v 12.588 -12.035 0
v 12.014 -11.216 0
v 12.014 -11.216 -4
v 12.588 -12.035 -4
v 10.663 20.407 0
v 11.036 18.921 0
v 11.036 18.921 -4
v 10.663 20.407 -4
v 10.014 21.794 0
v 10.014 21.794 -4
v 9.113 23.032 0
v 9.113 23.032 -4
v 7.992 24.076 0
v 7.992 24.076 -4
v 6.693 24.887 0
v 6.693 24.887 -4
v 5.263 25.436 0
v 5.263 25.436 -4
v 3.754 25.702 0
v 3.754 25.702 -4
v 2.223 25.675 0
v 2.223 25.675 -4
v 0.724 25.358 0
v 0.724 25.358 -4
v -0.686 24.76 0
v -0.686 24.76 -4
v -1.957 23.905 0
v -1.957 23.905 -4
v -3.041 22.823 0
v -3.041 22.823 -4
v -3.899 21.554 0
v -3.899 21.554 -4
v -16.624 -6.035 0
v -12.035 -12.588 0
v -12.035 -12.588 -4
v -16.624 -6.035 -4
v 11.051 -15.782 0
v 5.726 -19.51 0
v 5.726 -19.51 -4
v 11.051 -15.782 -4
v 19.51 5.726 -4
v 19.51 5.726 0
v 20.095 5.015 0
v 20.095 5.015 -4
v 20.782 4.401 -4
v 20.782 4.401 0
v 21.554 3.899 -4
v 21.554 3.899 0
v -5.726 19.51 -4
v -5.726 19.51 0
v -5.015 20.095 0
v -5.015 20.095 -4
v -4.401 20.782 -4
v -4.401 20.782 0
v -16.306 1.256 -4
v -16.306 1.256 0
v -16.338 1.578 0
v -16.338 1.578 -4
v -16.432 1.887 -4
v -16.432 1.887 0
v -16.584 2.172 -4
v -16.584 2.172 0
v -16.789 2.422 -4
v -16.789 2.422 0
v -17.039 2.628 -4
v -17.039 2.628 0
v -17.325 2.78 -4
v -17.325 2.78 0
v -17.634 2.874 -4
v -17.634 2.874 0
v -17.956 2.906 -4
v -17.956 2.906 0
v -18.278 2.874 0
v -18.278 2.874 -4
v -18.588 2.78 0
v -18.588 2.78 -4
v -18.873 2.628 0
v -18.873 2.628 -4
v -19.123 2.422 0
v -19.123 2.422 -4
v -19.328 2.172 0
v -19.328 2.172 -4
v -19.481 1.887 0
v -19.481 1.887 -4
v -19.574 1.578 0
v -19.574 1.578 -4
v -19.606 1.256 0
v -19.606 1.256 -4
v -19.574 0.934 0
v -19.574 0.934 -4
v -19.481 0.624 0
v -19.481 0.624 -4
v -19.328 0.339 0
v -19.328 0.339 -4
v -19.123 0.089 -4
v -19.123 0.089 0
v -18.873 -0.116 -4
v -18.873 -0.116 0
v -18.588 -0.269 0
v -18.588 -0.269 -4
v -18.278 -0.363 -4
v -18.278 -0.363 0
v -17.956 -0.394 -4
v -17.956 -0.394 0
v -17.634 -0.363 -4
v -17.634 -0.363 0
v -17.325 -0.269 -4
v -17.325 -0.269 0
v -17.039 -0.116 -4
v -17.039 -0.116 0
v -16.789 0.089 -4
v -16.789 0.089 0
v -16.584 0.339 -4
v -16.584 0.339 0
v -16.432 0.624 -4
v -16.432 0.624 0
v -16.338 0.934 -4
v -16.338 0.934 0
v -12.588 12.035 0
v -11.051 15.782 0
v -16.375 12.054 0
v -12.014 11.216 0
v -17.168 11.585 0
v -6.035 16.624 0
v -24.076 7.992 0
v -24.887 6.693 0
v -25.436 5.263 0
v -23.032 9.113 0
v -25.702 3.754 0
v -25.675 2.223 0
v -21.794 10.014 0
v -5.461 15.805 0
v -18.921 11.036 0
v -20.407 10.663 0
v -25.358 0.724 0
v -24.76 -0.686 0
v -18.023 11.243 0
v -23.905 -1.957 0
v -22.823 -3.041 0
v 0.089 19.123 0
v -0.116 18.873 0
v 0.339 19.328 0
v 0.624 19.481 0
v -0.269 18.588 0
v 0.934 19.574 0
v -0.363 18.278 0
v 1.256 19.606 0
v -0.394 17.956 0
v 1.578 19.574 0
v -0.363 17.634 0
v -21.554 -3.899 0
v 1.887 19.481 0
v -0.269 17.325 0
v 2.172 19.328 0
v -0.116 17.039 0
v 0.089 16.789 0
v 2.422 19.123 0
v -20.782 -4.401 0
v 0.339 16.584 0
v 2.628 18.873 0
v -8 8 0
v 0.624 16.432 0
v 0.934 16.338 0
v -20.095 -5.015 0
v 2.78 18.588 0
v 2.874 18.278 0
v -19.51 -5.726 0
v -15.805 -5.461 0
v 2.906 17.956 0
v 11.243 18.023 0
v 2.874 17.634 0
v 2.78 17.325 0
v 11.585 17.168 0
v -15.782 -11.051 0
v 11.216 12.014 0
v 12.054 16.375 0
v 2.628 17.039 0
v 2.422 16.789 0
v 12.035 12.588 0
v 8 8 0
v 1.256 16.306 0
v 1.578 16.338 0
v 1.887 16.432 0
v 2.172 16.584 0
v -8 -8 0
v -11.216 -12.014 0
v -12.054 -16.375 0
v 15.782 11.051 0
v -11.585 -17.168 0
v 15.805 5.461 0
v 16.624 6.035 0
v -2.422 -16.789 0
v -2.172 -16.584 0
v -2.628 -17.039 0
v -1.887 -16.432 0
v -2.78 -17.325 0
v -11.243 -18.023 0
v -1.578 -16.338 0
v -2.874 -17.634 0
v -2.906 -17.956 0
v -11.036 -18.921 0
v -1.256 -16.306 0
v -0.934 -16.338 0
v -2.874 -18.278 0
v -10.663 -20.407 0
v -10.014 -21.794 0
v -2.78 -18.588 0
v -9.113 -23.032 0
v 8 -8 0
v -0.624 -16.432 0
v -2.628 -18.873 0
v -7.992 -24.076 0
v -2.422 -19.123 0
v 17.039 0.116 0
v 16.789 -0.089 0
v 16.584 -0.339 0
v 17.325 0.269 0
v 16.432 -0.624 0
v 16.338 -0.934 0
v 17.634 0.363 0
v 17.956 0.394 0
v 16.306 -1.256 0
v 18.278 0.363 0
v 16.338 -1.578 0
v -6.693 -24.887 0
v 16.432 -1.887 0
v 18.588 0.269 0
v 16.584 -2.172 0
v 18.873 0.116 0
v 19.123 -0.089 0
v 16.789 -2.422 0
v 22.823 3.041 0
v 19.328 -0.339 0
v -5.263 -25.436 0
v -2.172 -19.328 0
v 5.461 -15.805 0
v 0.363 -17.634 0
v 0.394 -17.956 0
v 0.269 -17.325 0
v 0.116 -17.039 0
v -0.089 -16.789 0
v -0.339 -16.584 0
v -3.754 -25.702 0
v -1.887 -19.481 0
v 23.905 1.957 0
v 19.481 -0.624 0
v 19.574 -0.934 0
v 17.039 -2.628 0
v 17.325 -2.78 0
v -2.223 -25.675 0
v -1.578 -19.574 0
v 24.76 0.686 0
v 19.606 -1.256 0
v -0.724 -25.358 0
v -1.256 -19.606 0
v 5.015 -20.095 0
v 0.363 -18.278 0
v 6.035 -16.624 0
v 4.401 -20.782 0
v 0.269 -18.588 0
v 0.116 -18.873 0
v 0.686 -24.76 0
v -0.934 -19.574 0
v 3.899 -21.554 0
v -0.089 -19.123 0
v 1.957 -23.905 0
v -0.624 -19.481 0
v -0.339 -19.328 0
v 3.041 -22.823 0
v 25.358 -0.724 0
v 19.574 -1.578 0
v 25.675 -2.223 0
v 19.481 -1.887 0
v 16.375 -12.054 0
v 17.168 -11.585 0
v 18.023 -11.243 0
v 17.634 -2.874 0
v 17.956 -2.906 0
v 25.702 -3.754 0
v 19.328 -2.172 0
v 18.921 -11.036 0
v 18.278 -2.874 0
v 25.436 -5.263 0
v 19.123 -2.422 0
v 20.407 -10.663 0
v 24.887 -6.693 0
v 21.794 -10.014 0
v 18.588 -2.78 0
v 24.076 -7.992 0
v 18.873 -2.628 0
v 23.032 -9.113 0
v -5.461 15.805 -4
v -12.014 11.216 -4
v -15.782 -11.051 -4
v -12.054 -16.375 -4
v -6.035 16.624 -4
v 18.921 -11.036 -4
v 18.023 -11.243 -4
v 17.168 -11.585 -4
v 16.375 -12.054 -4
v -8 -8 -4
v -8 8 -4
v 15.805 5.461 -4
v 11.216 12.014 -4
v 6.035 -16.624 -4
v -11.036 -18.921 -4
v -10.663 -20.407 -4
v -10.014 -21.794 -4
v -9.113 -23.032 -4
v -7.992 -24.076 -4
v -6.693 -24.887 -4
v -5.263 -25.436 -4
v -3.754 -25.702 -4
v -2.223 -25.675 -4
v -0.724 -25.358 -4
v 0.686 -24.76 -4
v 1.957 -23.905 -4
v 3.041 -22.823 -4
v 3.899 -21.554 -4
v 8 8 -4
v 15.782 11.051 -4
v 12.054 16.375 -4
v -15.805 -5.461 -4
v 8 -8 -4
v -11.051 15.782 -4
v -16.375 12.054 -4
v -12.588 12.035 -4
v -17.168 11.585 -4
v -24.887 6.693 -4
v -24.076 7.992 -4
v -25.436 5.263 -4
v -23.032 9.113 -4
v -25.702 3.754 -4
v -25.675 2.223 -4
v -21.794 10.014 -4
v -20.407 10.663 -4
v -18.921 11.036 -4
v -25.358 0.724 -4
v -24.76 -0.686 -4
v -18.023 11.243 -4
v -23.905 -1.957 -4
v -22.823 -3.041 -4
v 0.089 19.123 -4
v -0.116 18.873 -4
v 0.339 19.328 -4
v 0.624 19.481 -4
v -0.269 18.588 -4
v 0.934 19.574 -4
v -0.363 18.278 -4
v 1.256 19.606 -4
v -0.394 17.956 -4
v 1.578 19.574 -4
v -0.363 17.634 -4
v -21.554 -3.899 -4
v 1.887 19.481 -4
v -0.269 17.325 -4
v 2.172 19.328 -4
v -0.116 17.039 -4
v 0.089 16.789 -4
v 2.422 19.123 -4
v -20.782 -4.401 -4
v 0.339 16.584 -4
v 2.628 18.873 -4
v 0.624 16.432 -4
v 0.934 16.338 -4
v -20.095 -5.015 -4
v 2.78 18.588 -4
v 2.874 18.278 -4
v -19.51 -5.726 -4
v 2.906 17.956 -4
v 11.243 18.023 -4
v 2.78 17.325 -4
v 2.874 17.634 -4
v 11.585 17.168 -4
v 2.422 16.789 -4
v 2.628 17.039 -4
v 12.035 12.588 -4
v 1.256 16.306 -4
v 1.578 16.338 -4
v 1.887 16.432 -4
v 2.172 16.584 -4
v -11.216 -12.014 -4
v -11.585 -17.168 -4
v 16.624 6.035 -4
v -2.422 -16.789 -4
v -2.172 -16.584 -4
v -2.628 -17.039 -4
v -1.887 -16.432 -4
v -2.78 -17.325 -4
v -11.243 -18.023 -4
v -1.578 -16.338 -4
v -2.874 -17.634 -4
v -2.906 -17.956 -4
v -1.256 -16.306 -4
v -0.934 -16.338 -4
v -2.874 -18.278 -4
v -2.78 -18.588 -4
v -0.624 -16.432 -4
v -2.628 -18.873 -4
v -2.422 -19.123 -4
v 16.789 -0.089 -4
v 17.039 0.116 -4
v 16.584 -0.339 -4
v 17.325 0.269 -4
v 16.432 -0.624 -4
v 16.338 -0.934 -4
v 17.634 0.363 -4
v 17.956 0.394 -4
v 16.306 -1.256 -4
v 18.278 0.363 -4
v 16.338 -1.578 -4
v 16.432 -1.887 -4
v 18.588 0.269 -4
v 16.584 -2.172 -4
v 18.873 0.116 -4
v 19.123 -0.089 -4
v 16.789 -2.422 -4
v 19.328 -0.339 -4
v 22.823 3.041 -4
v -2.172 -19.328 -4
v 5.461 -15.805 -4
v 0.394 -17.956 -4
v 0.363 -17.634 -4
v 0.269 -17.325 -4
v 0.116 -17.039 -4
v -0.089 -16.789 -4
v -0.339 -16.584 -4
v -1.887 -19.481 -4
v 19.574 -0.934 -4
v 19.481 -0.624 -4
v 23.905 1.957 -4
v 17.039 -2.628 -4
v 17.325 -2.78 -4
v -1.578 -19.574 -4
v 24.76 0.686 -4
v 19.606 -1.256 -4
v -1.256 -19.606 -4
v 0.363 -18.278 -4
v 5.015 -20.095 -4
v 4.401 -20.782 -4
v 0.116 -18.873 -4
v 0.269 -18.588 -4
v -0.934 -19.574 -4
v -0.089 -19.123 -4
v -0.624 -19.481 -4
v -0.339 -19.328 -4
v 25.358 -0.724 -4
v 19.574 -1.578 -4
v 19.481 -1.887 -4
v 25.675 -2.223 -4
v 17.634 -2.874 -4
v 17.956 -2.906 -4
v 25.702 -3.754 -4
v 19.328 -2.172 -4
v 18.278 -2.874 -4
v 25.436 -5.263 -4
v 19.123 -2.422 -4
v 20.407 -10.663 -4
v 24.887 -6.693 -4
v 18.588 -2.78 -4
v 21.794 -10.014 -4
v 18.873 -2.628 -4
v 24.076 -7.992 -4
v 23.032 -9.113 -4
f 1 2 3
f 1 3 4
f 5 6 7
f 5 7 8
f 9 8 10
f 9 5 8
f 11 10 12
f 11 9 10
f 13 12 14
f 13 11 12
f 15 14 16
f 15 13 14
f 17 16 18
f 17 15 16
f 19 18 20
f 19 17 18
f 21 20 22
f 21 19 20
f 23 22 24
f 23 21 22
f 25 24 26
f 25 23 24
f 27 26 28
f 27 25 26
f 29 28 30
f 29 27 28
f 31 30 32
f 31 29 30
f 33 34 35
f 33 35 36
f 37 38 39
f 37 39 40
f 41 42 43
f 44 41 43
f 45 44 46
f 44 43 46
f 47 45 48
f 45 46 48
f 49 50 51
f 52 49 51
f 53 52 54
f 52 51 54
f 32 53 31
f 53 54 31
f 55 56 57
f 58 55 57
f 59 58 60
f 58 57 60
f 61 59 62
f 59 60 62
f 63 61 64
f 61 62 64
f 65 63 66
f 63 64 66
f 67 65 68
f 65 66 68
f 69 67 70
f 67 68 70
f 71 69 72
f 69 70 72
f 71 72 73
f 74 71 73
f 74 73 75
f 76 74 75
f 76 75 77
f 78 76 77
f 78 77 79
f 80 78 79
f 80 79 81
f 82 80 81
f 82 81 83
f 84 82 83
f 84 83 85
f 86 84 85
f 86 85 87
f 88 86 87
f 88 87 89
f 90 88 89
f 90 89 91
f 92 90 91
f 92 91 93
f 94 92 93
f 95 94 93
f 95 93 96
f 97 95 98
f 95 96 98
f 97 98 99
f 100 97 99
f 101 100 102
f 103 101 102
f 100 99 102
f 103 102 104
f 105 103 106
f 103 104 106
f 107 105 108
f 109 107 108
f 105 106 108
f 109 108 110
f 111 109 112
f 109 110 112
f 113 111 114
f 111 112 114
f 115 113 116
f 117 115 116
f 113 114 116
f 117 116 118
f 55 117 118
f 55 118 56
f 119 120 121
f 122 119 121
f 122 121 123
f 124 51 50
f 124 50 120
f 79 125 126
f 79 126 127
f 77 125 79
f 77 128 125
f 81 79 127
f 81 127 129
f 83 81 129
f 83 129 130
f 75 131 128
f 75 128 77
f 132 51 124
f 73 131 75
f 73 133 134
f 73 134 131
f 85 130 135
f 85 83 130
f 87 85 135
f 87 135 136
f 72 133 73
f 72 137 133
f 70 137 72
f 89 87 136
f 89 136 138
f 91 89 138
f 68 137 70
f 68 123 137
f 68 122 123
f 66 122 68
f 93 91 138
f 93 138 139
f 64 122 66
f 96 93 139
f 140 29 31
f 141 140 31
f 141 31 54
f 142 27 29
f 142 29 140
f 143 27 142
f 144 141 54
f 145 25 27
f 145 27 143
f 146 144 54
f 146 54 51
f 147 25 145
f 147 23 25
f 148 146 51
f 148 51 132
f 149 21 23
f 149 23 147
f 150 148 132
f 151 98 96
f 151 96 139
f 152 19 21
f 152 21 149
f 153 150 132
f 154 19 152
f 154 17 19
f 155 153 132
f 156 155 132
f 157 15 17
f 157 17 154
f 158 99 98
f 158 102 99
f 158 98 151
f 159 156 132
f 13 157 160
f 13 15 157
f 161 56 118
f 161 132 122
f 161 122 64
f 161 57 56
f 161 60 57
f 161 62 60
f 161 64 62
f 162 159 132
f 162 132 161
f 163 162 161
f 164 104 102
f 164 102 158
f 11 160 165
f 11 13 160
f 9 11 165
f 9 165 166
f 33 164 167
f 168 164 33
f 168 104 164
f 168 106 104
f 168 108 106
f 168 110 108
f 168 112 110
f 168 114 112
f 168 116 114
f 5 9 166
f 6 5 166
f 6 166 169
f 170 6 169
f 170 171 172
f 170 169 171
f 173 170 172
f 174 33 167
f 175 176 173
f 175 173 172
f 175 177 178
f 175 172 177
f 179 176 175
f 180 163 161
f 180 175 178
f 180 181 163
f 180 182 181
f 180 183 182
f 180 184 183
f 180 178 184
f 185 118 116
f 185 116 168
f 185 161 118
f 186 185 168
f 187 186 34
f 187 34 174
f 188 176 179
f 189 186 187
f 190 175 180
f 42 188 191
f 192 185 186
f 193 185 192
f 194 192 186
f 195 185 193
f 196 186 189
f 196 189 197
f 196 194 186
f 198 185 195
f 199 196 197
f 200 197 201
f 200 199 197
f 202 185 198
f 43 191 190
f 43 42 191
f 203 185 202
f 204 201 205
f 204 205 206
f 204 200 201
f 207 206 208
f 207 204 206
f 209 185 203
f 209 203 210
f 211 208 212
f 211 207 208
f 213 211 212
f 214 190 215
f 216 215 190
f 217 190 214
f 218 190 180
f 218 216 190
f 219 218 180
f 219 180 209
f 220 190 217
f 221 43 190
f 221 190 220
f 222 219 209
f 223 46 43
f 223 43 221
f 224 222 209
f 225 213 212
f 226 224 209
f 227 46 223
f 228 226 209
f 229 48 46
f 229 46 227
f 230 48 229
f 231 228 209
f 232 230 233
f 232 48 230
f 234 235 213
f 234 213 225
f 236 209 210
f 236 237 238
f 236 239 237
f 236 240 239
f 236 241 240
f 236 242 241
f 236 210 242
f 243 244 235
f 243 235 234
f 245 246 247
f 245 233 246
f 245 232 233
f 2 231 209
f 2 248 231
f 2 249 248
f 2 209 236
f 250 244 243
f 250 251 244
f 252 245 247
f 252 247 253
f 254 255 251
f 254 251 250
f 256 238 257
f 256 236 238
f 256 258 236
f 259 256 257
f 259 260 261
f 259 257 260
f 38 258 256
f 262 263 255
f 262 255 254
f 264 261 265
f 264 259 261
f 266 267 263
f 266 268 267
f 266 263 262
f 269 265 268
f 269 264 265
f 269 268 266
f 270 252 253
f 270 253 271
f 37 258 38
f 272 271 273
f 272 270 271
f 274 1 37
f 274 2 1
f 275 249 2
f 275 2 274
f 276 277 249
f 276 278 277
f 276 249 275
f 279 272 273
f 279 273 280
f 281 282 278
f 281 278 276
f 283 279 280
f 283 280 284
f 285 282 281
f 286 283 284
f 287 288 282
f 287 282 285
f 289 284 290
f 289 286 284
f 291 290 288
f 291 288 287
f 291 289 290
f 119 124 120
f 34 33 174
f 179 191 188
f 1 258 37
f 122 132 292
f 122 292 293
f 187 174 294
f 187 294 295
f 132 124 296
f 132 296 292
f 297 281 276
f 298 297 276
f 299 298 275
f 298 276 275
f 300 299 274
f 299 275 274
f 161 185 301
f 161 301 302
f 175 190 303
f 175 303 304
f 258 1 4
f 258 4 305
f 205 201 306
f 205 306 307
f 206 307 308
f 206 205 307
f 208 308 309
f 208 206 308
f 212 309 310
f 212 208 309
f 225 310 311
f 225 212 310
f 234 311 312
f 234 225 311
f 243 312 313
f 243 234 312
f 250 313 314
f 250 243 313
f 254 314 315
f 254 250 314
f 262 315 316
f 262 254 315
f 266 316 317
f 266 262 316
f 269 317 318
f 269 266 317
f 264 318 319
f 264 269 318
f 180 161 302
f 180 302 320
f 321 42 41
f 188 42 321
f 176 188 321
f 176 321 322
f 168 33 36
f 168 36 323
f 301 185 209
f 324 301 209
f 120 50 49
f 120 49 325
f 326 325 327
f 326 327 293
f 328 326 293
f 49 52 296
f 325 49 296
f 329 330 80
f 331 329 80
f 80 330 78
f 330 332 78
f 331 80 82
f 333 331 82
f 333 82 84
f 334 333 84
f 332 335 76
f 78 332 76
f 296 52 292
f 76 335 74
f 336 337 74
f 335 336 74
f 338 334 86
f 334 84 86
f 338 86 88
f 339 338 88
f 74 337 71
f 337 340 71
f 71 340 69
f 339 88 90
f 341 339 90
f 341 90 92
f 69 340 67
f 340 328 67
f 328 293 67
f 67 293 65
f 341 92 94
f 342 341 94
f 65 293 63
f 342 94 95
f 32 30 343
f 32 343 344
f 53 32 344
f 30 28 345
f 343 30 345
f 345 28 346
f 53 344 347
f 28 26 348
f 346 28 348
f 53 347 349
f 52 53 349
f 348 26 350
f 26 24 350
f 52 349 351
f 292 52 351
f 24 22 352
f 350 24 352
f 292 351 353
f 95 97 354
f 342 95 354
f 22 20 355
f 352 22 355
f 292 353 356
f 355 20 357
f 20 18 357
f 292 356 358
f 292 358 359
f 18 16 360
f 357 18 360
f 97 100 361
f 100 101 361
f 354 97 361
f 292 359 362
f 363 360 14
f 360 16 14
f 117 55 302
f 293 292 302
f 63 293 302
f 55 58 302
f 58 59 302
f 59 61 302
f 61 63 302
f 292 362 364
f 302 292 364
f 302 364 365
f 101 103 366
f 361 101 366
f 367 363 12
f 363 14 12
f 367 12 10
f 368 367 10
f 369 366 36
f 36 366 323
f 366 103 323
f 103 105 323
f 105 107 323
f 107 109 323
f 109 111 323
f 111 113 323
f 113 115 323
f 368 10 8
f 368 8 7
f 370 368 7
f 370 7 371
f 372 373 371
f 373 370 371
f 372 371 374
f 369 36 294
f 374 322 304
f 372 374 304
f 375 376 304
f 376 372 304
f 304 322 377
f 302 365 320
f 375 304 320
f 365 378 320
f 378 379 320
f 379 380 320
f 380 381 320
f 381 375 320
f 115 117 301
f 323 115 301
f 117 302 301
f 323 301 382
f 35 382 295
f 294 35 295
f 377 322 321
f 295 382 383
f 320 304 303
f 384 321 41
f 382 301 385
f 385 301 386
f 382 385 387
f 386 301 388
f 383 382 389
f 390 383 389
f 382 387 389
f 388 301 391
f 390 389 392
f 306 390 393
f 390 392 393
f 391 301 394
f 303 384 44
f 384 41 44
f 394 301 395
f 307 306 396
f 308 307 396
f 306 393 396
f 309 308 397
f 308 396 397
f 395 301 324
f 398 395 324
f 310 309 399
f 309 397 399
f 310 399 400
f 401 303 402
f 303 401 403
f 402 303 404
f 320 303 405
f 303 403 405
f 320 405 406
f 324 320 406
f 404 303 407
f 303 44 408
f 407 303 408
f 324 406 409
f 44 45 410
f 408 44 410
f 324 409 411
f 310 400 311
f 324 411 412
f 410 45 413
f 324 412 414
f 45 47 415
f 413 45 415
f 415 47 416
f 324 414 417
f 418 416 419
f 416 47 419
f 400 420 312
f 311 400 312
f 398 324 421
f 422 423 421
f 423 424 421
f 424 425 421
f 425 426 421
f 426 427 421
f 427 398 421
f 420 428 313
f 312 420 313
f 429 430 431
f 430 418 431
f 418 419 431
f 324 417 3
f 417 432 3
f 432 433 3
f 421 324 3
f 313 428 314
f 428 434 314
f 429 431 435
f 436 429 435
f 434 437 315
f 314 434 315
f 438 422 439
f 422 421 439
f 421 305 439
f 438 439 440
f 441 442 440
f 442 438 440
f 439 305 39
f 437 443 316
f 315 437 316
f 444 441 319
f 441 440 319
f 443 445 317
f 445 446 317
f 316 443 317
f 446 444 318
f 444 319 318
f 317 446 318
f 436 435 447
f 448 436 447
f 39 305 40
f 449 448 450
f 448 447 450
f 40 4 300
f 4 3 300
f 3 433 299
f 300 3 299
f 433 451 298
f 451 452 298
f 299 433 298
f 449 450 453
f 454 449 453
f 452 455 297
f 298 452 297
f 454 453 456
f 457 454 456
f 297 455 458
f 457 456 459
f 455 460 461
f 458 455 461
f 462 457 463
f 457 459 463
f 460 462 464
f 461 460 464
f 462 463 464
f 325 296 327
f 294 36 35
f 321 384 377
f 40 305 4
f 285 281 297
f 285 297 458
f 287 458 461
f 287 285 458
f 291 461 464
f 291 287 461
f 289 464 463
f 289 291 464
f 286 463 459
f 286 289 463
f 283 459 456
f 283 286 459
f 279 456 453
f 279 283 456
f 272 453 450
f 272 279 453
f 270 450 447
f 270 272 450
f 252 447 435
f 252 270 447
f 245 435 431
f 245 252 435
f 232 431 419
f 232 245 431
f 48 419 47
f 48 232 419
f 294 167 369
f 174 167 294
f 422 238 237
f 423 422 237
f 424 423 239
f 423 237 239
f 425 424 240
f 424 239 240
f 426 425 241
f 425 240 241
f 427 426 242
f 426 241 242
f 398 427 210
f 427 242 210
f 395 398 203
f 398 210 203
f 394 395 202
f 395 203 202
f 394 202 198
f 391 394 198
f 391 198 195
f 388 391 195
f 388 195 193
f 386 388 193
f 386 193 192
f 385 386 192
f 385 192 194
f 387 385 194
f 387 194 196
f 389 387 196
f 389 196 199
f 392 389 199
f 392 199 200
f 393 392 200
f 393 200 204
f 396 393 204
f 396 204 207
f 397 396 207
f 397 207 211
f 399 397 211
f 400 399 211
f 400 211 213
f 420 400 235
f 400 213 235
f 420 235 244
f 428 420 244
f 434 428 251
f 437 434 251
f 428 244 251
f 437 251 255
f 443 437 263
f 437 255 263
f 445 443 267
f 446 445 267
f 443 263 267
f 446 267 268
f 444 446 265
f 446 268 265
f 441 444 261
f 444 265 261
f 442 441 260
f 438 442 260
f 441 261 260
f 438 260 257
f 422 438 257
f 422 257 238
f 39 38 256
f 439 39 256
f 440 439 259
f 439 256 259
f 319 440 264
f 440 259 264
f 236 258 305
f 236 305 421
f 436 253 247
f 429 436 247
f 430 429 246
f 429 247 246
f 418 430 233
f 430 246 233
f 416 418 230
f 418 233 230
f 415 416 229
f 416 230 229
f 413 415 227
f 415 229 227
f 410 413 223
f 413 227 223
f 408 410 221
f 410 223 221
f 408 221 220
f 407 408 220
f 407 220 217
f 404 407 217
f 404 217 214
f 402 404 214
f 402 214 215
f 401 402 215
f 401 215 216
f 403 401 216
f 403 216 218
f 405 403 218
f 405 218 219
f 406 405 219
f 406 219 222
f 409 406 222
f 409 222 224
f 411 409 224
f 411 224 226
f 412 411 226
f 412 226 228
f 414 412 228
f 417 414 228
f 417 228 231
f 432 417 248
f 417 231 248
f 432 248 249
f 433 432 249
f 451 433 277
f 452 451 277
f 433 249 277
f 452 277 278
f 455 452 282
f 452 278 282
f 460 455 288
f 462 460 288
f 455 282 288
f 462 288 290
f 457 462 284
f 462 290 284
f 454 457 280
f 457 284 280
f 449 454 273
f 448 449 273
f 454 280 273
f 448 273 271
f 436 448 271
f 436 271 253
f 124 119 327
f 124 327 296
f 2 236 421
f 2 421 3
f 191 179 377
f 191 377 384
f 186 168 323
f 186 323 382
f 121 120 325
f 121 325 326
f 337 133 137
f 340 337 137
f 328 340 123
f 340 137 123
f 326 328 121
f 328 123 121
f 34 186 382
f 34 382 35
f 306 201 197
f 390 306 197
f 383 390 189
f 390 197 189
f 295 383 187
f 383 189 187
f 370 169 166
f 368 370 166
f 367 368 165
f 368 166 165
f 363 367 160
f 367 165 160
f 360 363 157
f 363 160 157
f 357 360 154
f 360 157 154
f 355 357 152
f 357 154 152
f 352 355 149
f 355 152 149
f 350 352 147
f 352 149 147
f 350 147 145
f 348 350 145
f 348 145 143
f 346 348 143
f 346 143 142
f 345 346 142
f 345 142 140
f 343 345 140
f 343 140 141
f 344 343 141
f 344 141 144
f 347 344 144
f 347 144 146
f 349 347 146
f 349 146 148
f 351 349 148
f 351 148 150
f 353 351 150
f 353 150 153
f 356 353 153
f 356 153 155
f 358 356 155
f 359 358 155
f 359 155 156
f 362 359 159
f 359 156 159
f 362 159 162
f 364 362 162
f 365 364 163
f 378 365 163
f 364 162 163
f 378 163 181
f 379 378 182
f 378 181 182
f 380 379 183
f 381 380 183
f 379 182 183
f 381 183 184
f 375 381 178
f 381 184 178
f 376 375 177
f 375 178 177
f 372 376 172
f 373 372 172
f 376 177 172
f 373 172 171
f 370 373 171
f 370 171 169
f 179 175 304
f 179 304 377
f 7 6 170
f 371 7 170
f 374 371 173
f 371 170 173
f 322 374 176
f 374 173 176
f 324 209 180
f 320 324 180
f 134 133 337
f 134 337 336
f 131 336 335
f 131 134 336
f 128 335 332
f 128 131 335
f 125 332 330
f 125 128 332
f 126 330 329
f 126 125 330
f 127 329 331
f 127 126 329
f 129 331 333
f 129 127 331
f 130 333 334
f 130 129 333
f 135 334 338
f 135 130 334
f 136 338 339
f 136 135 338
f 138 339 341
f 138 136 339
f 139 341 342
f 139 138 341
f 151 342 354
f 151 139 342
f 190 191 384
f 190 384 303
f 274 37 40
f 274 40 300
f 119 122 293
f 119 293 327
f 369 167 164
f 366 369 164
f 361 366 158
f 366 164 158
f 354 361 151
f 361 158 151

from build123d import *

# Parameters (mm, degrees)
PAD006_DEPTH          = 4
POLARPATTERN002_COUNT = 4
SKETCH012_W           = 16
SKETCH012_H           = 16
POCKET001_DEPTH       = 4.001
SKETCH018_R           = 1.65
HOLE_DEPTH            = 12.001
POCKET005_DEPTH       = 149.7520027338
POLARPATTERN_COUNT    = 4


with BuildPart() as part:
    # Sketch → Pad006 (new body)
    with BuildSketch(Plane.XY):
        with BuildLine():
            ThreePointArc((18.9209111487, -11.036007045), (25.6050015783, -4.5148526193), (21.5543772962, 3.8991216402))
            ThreePointArc((19.510343337, 5.7262546507), (20.4266011455, 4.694374188), (21.5543772962, 3.8991216402))
            Line((19.510343337, 5.7262546507), (15.7820965007, 11.0507429386))
            Line((0, 0), (15.7820965007, 11.0507429386))
            Line((0, 0), (11.0507429386, -15.7820965007))
            Line((11.0507429386, -15.7820965007), (16.3752312264, -12.0538496644))
            ThreePointArc((18.9209111487, -11.036007045), (17.5891558316, -11.3975778351), (16.3752312264, -12.0538496644))
        make_face()
    pad006 = extrude(amount=-PAD006_DEPTH)

    # PolarPattern002: Pad006 ×4 about axis
    polarpattern002_axis = Axis((0, 0, 0), (0, 0, 1))
    for i in range(1, POLARPATTERN002_COUNT):
        add(pad006.rotate(polarpattern002_axis, i * 360 / POLARPATTERN002_COUNT))

    # Sketch012 → Pocket001 (cut, through all)
    with BuildSketch(Plane.XY):
        Rectangle(SKETCH012_W, SKETCH012_H)
    extrude(amount=-POCKET001_DEPTH, mode=Mode.SUBTRACT)

    # Sketch018 → Hole (cut, through all)
    with BuildSketch(Plane.XY.offset(8)):
        with Locations((1.2556165274, 17.9561529047)):
            Circle(SKETCH018_R)
        with Locations((-1.2556165274, -17.9561529047)):
            Circle(SKETCH018_R)
        with Locations((-17.9561529047, 1.2556165274)):
            Circle(SKETCH018_R)
        with Locations((17.9561529047, -1.2556165274)):
            Circle(SKETCH018_R)
    extrude(amount=-HOLE_DEPTH, mode=Mode.SUBTRACT)

    # Sketch021 → Pocket005 (cut, through all)
    with BuildSketch(Plane.XY):
        Polygon((11.2159688683, 12.0143126733), (12.0351209126, 12.5878891096), (16.6237324034, 6.0346727553), (15.8045803591, 5.461096319), align=None)
    pocket005 = extrude(amount=-POCKET005_DEPTH, mode=Mode.SUBTRACT)

    # PolarPattern: Pocket005 ×4 about axis
    polarpattern_axis = Axis((0, 0, 0), (0, 0, 1))
    for i in range(1, POLARPATTERN_COUNT):
        add(pocket005.rotate(polarpattern_axis, i * 360 / POLARPATTERN_COUNT), mode=Mode.SUBTRACT)


solid = part.part
